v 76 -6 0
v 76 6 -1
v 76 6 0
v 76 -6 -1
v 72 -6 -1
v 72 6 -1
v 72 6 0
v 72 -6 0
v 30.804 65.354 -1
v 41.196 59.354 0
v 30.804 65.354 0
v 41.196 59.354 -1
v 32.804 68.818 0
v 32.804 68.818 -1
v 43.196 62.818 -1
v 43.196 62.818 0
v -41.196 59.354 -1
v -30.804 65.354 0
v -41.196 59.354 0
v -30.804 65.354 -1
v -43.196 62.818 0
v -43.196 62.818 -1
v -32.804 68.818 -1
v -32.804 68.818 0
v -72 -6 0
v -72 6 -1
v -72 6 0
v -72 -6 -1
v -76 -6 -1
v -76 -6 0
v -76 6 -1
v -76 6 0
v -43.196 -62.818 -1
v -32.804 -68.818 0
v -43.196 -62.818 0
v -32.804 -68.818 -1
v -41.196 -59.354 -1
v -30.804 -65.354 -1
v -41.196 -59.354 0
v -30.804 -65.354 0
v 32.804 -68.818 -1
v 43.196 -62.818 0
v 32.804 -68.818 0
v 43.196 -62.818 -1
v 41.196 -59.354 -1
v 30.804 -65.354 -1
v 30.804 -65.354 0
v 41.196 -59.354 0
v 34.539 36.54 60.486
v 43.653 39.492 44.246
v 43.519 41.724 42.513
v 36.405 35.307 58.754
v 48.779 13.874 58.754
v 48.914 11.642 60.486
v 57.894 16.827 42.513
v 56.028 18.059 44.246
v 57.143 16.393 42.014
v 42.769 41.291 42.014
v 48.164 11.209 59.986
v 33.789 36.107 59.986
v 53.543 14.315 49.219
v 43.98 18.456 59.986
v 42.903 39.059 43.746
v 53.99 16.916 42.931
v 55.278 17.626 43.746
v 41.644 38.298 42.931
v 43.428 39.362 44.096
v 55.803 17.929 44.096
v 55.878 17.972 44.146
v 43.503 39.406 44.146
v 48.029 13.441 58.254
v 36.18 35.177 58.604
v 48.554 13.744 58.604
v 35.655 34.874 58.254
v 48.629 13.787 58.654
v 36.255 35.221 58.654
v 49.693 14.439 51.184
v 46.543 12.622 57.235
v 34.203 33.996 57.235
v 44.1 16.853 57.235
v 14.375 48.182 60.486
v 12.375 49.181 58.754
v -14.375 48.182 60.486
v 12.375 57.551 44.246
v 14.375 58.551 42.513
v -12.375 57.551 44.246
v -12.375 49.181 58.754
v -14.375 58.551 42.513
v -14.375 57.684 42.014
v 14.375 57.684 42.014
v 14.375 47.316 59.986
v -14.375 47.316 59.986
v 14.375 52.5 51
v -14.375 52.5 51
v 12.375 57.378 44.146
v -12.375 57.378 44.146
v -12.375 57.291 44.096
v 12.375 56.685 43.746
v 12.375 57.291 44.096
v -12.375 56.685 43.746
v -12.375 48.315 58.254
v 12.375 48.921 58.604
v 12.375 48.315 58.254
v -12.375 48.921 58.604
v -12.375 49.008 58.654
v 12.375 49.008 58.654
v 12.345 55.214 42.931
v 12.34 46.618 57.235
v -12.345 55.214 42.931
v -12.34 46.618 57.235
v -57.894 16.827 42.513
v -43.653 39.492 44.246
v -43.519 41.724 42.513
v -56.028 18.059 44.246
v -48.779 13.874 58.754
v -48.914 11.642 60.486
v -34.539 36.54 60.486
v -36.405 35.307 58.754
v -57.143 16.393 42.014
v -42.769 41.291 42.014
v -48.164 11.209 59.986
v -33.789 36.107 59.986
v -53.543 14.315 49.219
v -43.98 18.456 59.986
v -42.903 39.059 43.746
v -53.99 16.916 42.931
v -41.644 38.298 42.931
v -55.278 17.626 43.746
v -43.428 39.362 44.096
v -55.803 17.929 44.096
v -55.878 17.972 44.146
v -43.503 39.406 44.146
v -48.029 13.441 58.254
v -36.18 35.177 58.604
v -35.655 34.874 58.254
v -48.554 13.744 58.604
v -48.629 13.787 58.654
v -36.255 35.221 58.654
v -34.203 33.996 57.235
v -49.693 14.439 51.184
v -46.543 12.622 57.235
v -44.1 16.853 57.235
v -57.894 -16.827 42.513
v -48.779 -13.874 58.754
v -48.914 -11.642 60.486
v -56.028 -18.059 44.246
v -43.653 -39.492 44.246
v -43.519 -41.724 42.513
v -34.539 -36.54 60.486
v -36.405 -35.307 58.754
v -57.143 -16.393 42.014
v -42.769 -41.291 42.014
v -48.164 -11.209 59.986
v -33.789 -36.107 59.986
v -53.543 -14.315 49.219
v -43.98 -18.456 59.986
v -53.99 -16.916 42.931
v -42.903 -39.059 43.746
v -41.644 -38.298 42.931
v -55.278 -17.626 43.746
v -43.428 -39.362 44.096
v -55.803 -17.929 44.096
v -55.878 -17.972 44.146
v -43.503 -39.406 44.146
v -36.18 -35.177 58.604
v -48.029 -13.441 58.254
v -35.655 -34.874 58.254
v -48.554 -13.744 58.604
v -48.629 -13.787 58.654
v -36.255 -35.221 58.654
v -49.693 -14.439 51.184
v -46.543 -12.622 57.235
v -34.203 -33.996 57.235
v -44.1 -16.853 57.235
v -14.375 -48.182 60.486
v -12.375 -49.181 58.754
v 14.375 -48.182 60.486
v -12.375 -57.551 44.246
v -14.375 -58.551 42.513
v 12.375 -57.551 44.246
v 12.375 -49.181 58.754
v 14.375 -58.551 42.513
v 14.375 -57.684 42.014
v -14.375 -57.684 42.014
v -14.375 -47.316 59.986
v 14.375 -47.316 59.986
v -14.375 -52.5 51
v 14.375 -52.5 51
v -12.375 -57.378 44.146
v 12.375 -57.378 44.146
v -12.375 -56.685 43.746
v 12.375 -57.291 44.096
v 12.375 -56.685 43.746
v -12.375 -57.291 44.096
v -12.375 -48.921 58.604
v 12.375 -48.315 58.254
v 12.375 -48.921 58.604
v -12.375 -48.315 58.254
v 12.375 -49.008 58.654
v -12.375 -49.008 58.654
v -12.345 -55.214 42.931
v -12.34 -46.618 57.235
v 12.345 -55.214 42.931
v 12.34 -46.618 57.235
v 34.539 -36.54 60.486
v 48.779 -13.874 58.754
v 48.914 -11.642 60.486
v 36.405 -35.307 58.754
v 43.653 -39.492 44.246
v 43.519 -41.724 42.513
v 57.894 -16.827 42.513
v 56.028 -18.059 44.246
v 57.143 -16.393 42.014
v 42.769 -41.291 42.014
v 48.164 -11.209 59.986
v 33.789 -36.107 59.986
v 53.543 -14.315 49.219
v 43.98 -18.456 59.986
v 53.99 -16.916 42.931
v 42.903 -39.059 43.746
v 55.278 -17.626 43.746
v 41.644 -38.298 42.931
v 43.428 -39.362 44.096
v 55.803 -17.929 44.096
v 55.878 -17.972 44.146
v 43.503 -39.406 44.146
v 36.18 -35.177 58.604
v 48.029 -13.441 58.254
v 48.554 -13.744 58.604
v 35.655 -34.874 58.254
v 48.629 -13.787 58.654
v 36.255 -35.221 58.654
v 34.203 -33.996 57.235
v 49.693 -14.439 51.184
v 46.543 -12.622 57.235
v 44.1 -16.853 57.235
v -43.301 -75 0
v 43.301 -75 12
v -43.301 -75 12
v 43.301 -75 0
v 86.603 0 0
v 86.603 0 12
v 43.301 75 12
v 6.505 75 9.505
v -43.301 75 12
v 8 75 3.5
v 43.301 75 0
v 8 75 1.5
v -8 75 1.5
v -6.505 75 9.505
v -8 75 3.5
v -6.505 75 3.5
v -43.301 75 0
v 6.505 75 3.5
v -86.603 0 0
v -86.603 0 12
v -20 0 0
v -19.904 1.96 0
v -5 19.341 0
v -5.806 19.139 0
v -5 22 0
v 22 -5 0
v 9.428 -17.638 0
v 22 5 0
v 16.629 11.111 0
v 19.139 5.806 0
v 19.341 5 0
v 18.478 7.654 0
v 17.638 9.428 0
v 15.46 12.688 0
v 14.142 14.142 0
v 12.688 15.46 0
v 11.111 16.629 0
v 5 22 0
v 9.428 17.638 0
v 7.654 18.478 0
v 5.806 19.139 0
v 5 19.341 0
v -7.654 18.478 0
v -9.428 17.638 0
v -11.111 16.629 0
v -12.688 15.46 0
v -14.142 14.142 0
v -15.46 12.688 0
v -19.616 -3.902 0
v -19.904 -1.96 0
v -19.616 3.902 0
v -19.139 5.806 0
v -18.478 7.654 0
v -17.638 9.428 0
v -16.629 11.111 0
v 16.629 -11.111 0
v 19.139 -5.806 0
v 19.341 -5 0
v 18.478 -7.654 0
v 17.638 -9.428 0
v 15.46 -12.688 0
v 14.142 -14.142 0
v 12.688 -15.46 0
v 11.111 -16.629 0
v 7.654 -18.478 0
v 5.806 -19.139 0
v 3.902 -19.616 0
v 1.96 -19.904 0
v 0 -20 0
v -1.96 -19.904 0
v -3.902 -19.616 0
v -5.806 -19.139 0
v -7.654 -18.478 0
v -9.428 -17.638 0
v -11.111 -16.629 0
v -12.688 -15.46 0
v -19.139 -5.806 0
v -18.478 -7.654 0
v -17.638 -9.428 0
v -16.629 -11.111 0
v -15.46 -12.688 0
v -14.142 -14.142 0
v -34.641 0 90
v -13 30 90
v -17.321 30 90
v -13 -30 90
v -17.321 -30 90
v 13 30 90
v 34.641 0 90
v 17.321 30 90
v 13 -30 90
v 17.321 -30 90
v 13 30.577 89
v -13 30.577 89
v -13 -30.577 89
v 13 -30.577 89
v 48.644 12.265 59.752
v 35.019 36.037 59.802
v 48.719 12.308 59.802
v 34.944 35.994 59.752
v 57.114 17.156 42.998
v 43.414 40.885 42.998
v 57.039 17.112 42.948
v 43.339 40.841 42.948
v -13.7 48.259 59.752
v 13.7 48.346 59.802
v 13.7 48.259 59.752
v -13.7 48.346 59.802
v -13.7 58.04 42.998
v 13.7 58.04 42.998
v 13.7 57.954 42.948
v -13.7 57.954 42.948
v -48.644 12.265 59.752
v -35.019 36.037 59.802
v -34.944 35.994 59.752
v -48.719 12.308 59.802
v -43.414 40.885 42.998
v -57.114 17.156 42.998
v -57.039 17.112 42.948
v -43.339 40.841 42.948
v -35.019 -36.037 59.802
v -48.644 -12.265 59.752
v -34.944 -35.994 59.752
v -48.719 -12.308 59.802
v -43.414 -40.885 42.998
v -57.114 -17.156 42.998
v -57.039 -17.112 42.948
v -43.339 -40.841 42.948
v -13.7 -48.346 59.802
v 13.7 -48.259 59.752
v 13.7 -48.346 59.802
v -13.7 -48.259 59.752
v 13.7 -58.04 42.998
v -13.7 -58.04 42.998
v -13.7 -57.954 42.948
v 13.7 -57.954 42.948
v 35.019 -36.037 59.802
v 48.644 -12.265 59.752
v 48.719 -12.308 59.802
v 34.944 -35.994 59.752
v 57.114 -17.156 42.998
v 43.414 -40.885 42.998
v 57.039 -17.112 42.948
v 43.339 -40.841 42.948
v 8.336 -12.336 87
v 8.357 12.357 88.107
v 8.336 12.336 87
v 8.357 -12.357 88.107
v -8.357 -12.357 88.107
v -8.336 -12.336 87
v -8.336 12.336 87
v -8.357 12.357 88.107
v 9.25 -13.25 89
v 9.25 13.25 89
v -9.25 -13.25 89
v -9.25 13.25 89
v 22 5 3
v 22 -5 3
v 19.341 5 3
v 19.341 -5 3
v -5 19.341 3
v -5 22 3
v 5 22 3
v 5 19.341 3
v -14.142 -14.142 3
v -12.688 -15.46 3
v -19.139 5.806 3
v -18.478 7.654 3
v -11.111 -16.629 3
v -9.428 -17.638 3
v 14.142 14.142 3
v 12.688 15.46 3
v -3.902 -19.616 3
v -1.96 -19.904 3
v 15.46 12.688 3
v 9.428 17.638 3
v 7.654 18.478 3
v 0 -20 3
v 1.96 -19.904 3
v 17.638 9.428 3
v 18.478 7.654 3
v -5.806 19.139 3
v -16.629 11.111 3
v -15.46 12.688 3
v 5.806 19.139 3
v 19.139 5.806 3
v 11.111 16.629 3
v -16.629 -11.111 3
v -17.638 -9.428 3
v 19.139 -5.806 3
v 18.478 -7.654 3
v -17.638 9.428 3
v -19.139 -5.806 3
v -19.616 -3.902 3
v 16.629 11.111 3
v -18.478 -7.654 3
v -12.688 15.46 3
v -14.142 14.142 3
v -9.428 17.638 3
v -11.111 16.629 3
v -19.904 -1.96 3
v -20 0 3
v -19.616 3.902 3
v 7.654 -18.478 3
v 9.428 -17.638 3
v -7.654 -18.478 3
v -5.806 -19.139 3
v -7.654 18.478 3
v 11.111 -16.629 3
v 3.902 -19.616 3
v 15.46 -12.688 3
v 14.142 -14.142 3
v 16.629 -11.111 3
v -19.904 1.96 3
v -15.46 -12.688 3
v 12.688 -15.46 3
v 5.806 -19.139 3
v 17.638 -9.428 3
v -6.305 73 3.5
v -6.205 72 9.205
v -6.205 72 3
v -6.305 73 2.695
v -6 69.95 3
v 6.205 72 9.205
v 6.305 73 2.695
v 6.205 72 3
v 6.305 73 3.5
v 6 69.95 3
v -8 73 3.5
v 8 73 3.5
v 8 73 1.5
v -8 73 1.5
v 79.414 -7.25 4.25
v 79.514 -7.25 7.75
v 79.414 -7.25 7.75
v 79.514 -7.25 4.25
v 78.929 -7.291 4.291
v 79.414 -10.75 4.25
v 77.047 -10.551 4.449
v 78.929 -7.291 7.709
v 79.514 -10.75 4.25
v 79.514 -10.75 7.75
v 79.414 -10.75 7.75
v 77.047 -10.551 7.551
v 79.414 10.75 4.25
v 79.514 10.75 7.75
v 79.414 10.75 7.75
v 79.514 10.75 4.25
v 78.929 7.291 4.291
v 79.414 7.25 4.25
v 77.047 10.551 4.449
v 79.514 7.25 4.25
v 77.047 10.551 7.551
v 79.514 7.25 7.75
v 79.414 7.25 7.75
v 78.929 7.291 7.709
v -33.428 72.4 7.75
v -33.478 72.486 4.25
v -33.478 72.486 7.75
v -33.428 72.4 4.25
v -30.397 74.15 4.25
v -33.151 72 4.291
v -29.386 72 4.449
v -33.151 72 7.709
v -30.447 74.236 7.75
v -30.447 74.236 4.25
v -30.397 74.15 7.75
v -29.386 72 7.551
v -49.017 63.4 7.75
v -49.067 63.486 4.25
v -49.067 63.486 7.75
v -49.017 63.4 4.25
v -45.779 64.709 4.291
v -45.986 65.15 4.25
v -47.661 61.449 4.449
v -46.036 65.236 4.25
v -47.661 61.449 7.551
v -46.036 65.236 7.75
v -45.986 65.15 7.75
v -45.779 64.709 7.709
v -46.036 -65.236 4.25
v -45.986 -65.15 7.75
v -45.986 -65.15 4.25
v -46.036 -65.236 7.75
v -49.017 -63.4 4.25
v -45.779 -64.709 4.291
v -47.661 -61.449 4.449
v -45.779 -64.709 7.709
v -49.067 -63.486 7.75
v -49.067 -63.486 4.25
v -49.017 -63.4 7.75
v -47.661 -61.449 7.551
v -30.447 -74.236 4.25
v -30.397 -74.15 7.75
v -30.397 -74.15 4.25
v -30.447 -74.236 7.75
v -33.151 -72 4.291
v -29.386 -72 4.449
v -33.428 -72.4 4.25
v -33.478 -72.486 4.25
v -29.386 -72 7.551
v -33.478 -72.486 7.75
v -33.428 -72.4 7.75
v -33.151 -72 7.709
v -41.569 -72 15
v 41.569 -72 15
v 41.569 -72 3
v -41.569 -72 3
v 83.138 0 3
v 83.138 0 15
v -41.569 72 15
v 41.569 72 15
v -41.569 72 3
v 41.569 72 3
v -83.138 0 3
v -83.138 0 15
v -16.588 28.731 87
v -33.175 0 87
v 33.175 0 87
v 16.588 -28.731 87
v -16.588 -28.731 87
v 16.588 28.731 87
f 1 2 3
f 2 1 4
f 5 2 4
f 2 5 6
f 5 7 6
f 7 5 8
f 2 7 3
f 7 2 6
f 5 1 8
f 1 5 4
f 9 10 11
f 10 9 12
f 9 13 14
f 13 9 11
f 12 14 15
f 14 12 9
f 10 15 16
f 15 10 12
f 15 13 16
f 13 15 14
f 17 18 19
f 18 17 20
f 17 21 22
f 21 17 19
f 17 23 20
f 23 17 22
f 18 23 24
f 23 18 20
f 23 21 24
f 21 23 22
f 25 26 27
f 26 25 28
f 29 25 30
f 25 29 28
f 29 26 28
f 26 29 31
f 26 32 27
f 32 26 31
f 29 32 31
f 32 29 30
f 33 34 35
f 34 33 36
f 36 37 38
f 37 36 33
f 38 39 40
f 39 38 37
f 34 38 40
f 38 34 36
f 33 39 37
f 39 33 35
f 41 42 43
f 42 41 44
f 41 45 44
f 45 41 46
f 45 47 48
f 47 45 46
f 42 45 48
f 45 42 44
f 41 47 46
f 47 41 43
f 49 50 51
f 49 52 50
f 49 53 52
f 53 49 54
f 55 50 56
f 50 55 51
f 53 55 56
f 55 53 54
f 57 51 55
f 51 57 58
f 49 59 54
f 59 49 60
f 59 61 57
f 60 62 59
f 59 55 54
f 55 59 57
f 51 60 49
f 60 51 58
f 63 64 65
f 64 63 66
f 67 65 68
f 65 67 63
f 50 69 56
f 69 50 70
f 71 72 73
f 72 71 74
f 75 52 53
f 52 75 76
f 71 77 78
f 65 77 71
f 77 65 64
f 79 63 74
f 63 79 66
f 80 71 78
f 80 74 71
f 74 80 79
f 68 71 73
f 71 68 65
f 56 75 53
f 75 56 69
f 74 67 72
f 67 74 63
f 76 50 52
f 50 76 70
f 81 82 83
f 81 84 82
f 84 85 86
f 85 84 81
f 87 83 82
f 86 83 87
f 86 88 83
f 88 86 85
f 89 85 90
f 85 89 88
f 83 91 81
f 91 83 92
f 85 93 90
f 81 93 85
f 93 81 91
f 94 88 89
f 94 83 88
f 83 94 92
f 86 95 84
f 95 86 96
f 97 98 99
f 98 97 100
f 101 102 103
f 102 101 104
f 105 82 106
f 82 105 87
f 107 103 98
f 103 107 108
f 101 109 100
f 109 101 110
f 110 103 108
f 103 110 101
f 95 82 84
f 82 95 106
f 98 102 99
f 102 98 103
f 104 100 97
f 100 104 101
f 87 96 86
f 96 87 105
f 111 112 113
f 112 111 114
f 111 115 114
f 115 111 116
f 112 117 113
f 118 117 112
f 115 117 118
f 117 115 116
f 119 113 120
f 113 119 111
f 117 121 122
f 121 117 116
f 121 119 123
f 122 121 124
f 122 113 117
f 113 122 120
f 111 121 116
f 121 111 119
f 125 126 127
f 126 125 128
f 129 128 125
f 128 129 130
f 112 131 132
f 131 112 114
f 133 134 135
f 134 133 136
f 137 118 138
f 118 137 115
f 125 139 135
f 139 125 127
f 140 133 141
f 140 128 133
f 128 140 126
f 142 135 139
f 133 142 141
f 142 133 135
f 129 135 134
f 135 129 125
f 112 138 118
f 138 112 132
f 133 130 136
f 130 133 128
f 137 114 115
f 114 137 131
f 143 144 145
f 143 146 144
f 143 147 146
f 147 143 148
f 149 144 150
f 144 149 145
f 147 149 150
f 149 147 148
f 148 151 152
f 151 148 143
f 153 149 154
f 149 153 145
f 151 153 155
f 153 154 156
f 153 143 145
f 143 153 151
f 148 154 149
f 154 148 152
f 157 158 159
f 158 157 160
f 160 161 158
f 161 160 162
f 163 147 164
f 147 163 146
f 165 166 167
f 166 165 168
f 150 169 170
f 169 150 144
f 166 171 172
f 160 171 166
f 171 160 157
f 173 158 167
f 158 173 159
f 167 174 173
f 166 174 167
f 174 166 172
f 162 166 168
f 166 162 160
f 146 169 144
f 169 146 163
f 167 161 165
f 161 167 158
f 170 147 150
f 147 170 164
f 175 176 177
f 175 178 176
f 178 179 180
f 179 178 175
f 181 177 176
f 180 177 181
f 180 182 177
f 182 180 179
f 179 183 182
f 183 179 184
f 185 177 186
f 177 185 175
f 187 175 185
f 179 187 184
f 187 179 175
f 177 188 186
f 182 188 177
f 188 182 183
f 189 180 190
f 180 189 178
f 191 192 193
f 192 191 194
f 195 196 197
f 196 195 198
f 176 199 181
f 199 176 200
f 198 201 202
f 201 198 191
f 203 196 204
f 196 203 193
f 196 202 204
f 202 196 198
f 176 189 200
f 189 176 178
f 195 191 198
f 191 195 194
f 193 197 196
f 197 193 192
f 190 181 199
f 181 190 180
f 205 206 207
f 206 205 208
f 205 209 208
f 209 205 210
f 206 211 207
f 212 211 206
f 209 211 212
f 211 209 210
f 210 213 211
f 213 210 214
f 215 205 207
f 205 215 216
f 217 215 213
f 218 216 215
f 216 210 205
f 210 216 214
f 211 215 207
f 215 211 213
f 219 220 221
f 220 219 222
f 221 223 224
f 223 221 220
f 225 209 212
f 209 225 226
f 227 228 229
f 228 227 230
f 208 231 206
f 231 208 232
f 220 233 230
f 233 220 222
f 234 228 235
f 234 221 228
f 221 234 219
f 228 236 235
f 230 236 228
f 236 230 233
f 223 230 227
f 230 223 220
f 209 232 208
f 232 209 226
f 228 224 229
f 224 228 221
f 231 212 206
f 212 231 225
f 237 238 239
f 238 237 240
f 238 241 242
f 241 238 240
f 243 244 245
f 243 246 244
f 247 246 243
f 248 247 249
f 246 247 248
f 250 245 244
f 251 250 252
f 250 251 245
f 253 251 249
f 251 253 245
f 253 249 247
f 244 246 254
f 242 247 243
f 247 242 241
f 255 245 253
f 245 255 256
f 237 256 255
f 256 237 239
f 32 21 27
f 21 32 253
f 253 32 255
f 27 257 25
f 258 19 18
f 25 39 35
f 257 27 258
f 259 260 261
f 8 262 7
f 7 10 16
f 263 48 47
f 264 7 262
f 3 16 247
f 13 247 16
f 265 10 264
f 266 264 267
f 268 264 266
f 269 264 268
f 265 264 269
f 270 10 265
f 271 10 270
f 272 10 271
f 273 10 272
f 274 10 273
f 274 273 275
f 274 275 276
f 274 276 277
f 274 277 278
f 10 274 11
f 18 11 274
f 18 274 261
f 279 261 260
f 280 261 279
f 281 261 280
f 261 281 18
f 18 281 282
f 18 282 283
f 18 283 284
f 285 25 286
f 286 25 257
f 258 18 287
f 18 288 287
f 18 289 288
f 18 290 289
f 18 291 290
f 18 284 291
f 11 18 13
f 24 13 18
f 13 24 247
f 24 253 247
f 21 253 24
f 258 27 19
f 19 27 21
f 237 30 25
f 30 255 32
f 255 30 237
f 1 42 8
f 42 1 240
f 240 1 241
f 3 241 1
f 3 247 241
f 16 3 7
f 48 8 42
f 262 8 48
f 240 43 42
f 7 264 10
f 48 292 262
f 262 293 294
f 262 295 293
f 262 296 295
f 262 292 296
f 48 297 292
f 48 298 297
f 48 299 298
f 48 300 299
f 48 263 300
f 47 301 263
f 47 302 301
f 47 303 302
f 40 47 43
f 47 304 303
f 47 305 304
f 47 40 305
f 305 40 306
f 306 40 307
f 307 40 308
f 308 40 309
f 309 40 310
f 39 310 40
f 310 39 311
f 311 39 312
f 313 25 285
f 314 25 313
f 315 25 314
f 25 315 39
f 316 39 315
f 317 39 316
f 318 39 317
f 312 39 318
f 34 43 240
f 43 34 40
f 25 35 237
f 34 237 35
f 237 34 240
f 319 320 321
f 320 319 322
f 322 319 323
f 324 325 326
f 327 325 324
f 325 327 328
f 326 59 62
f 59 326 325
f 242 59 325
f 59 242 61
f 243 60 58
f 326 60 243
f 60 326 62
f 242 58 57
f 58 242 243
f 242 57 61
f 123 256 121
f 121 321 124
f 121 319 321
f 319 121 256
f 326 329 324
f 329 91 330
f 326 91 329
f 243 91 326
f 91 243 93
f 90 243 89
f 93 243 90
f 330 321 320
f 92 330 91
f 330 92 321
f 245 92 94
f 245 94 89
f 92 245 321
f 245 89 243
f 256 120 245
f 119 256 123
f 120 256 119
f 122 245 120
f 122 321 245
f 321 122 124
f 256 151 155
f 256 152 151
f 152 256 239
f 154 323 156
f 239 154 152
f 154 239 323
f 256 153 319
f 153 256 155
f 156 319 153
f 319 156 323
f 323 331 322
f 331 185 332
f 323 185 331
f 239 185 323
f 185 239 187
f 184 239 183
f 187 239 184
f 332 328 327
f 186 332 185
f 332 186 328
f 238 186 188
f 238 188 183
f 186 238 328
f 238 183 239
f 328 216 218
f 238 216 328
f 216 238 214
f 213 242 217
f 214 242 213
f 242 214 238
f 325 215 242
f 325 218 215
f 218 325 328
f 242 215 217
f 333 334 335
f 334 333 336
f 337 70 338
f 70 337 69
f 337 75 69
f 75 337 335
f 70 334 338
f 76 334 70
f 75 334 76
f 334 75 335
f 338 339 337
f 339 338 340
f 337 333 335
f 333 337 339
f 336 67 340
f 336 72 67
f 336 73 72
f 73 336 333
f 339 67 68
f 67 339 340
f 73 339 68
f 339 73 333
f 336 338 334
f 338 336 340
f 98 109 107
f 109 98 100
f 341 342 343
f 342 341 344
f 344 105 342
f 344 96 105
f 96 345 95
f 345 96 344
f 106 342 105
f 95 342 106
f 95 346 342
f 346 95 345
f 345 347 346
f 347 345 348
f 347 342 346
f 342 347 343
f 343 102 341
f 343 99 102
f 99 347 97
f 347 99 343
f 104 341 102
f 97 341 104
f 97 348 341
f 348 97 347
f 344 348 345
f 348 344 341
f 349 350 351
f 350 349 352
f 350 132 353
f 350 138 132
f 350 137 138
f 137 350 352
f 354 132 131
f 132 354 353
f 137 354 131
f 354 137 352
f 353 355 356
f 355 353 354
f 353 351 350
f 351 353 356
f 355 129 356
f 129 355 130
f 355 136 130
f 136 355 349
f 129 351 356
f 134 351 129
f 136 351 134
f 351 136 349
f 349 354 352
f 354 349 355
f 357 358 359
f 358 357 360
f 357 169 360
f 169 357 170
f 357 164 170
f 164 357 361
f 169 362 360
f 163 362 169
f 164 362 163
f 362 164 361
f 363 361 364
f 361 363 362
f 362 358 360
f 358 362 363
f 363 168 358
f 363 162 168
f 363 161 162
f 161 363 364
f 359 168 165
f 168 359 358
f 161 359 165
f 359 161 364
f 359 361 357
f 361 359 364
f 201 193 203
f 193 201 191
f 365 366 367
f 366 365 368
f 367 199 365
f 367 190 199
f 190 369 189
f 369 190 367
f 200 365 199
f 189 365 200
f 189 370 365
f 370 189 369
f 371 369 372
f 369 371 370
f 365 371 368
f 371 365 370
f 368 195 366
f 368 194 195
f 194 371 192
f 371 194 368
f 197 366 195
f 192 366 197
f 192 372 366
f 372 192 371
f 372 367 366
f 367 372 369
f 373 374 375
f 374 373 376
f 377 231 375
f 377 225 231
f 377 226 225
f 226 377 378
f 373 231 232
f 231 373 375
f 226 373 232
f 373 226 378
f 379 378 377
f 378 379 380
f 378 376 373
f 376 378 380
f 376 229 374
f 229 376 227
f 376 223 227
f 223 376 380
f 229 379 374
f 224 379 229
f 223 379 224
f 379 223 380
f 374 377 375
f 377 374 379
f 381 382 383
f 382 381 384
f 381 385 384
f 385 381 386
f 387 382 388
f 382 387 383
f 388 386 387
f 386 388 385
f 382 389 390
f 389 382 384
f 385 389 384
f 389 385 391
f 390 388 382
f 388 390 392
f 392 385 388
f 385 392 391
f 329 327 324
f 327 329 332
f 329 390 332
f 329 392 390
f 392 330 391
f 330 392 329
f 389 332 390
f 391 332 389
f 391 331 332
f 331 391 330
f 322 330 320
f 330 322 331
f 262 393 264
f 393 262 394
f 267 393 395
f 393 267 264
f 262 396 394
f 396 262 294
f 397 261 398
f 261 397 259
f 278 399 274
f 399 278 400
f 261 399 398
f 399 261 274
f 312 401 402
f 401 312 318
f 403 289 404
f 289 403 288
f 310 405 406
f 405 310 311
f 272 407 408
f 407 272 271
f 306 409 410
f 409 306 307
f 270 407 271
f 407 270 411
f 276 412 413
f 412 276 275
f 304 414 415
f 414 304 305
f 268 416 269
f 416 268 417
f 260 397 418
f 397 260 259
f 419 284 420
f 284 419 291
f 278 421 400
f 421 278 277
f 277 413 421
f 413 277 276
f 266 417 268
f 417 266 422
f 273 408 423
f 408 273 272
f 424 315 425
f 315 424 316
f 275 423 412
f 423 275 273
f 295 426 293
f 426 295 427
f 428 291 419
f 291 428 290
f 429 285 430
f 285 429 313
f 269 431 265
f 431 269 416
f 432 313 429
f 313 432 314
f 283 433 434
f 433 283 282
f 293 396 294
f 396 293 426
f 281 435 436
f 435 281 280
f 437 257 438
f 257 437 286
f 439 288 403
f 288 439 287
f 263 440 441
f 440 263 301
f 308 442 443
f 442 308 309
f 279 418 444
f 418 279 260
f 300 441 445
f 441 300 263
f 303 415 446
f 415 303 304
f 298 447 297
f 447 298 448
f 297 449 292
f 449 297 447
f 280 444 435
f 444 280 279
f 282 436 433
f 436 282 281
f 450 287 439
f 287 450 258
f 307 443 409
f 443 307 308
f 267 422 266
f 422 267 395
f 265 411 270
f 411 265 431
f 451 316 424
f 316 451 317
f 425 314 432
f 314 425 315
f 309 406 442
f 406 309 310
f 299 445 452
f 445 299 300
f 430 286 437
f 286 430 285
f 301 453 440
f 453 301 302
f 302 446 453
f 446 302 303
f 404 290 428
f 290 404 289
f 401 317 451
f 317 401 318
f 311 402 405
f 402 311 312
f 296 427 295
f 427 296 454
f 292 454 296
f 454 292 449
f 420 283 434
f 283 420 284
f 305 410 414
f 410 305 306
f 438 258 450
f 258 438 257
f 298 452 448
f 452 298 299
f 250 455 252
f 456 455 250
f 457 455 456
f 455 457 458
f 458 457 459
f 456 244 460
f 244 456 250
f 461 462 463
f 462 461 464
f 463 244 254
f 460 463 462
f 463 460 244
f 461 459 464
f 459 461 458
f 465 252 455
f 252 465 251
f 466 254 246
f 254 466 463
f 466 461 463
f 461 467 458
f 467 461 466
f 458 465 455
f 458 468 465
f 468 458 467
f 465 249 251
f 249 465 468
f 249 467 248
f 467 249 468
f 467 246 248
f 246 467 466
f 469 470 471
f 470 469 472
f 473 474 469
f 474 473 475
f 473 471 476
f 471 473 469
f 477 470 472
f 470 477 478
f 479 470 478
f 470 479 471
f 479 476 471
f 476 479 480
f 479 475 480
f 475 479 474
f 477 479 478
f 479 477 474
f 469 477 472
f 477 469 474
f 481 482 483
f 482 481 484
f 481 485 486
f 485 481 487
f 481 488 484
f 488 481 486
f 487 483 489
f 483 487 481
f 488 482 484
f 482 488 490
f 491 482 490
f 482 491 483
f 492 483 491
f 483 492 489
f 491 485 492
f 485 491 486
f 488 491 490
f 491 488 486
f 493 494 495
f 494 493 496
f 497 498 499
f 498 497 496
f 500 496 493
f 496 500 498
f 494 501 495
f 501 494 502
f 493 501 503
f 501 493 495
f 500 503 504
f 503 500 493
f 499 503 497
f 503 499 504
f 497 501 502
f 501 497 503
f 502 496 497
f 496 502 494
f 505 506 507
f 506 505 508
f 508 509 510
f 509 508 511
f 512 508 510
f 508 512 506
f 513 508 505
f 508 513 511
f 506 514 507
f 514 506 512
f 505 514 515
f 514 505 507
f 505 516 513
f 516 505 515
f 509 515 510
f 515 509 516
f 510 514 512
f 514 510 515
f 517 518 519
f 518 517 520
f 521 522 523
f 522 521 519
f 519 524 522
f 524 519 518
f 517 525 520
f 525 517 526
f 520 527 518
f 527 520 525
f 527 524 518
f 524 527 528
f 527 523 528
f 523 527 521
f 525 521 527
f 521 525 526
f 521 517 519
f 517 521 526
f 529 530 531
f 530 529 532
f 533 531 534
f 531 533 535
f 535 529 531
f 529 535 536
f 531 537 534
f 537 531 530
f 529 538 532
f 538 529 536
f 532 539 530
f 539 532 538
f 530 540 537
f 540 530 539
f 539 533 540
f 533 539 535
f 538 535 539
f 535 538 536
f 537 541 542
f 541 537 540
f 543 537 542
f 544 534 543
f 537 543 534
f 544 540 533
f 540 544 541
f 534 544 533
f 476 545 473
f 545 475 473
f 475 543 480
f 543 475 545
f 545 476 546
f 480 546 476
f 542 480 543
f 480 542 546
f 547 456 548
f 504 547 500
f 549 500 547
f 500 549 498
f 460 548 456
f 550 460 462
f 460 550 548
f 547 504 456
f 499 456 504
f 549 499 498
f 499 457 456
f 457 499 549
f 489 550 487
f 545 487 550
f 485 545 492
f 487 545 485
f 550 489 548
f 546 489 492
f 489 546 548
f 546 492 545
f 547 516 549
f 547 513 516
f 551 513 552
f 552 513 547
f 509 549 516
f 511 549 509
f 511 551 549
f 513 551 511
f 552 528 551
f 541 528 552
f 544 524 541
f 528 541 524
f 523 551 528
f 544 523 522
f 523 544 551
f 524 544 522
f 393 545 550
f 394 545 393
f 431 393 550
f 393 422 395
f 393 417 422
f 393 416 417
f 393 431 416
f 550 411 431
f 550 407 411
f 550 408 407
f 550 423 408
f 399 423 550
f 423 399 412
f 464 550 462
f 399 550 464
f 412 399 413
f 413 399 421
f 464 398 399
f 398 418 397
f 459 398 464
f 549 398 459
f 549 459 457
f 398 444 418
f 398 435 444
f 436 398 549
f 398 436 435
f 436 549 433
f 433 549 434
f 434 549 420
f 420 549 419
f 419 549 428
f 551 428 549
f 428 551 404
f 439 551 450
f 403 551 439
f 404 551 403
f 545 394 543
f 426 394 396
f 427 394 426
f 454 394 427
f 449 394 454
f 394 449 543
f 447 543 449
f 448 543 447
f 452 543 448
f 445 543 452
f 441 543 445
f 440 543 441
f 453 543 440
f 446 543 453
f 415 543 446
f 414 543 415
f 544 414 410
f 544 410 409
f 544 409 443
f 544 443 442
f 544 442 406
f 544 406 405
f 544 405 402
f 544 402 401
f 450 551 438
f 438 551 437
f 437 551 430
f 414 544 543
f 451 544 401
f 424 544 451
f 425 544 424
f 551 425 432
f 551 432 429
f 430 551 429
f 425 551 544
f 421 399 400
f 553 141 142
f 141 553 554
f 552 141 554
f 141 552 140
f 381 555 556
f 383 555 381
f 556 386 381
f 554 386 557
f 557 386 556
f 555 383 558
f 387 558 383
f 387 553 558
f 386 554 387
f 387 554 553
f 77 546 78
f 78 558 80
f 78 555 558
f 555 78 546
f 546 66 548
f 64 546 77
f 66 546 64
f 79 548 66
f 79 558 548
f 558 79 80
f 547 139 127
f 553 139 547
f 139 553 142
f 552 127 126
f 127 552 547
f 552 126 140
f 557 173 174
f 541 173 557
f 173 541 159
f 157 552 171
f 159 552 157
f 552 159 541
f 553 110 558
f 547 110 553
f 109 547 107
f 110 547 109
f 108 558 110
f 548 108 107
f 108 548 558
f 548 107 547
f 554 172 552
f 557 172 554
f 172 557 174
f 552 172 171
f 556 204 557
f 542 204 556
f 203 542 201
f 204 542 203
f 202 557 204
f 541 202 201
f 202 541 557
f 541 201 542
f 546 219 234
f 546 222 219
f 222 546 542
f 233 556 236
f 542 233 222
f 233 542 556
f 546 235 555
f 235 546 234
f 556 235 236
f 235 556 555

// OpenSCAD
// ==========================================
// Xentient Framework - Main Node Module V3
// Scaled: 150mm base, 90mm height, stack zoning
// ==========================================
// Print: PETG, 0.2mm layers, 45° overhangs (support-free)
// Bed: Base (150mm F2F) flat on bed, rear face down
// Units: mm
//
// V3 — Clean hollow shell. All interior features are separate prints.
// See nodebase/SPEC-v3.md for interior module print list + glue positions.

$fn = 128;

// ==========================================
// 1. MASTER PARAMETERS
// ==========================================

// --- Hub Shell (Truncated Hex Pyramid) ---
Base_F2F    = 150.0;
Front_F2F   = 60.0;
Total_Depth = 90.0;
Collar_H    = 12.0;
Shell_T     = 3.0;

// Derived geometry
Base_R    = (Base_F2F / 2) / cos(30);     // 80.83
Front_R   = (Front_F2F / 2) / cos(30);    // 34.64
Pyr_H     = Total_Depth - Collar_H;        // 78
Base_Apo  = Base_F2F / 2;                  // 70
Front_Apo = Front_F2F / 2;                 // 30
Face_Tilt = atan((Base_Apo - Front_Apo) / Pyr_H);  // ~27.9 deg

// Inner cavity
Inner_Base_R  = Base_R - Shell_T / cos(30);    // ~77.37
Inner_Front_Z = Total_Depth - Shell_T;          // Z=87
Outer_R_at_front  = Base_R + (Front_R - Base_R) * (Inner_Front_Z - Collar_H) / Pyr_H;
Inner_Front_R2 = Outer_R_at_front - Shell_T / cos(30);  // ~32.17

// --- Universal Socket Pocket ---
Port_W       = 24.4;    // Male sled width + 0.4mm tolerance
Port_H       = 16.4;    // Male sled height + 0.4mm tolerance
Port_D       = 10.0;    // Pocket depth per Framework §2 (10mm female socket)
WireCh_W     = 18.0;    // Wire channel width
WireCh_H     = 8.0;     // Wire channel height
Mounting_Lip = 2.0;     // Internal flange for JST-breakout PCB
Breakout_W   = 30.0;    // JST-breakout PCB width
Breakout_H   = 20.0;    // JST-breakout PCB height
Sleeve_Wall  = 2.0;     // Pocket sleeve wall thickness

// --- Fastener specs ---
M3_Hole   = 3.2;   // M3 heat-set insert hole
M3_Boss   = 5.0;   // Slim M3 boss
M3_Insert = 4.2;   // Heat-set insert for M3
M2_Hole   = 2.4;   // M2 screw body
M2_Boss   = 4.0;   // Slim M2 boss (spec says 4mm)

// --- Rear Anchor ---
Anchor_Dia = 40.0;
Anchor_Dep = 6.0;
Anchor_Key = 10.0;

// --- Ventilation ---
Vent_N      = 4;       // Slits per face set
Vent_W      = 2.0;     // Slit width
Vent_Spc    = 6.0;     // Slit spacing
Wall_Thick  = Shell_T / cos(30);  // ~3.46mm

// --- USB-C Cutout ---
USB_W = 12.0;   // V3 spec: 12mm (was 14mm)
USB_H = 6.0;

// --- LCD Display ---
LCD_W       = 71.0;
LCD_H       = 26.0;
LCD_D       = 15.0;
LCD_Mount_X = 32.0;
LCD_Mount_Y = 12.0;

// ==========================================
// 3. SOCKET POCKET NEGATIVE (cuts opening through wall + sleeve)
// ==========================================

module socket_pocket_negative() {
    draft_off = Port_D * tan(1.0);  // 1 deg draft

    // Main pocket passage (Port_H is vertical, Port_W is horizontal)
    hull() {
        translate([0, 0, 0.5])
            cube([Port_H + 2*draft_off, Port_W + 2*draft_off, 1], center=true);
        translate([0, 0, -Port_D + 0.5])
            cube([Port_H, Port_W, 1], center=true);
    }

    // Wire pass-through (continues past pocket into cavity)
    translate([0, 0, -Port_D/2 - 10])
        cube([WireCh_H, WireCh_W, 20], center=true);

    // 45 deg entry chamfer
    chamfer_z = 1.5;
    translate([0, 0, chamfer_z / 2])
        hull() {
            cube([Port_H + 2*chamfer_z, Port_W + 2*chamfer_z, 0.1], center=true);
            cube([Port_H + 2*draft_off, Port_W + 2*draft_off, 0.1], center=true);
        }

    // Breakout PCB mounting lip recesses (2mm flange, 30x20mm PCB)
    // Cut screw holes for M2 at corners of 30x20 breakout
    bp_w = Breakout_W - 4;  // screw span width
    bp_h = Breakout_H - 4;  // screw span height
    translate([0, 0, -Port_D])
        for (sx = [-1, 1], sy = [-1, 1]) {
            translate([sx * bp_w/2, sy * bp_h/2, 0])
                cylinder(h=Mounting_Lip + 1, d=M2_Hole, $fn=24);
        }
}

// ==========================================
// 4. SOCKET POCKET SLEEVE (positive: adds pocket depth)
// ==========================================

module socket_pocket_sleeve() {
    // Positive boss extending inward from inner wall surface
    // Creates the 10mm deep recessed pocket per Framework §2
    // Wall swells from 3mm to ~10mm only at socket locations

    draft_off = Port_D * tan(1.0);

    difference() {
        // Outer sleeve body (24.4 + 2*2 = 28.4mm wide, 16.4 + 2*2 = 20.4mm tall)
        hull() {
            translate([0, 0, 0.5])
                cube([Port_H + 2*Sleeve_Wall + 2*draft_off,
                      Port_W + 2*Sleeve_Wall + 2*draft_off, 1], center=true);
            translate([0, 0, -Port_D + 0.5])
                cube([Port_H + 2*Sleeve_Wall, Port_W + 2*Sleeve_Wall, 1], center=true);
        }

        // Inner passage (matches pocket opening with draft)
        hull() {
            translate([0, 0, 0.5])
                cube([Port_H + 2*draft_off, Port_W + 2*draft_off, 1], center=true);
            translate([0, 0, -Port_D + 0.5])
                cube([Port_H, Port_W, 1], center=true);
        }

        // Wire channel opening at the back of the sleeve
        translate([0, 0, -Port_D])
            cube([WireCh_H, WireCh_W, 4], center=true);

        // Breakout PCB mounting lip (2mm flange recess)
        // This creates a shelf for the 30x20 JST-breakout PCB
        translate([0, 0, -Port_D + Mounting_Lip/2])
            cube([Breakout_W, Breakout_H, Mounting_Lip], center=true);
    }
}

// ==========================================
// 5. FRONT CENTER PORT (Top Face - LCD Display)
// ==========================================

module front_port_negative() {
    // Pocket cutout through front face + sleeve (with 1° draft, matching side pockets)
    draft_off = Port_D * tan(1.0);
    translate([0, 0, Total_Depth - Port_D / 2])
        hull() {
            translate([0, 0, Port_D/2 - 0.5])
                cube([Port_H + 2*draft_off, Port_W + 2*draft_off, 1], center=true);
            translate([0, 0, -Port_D/2 + 0.5])
                cube([Port_H, Port_W, 1], center=true);
        };

    // Wire channel inward
    translate([0, 0, Inner_Front_Z / 2 + Shell_T])
        cube([WireCh_H, WireCh_W, Inner_Front_Z - Port_D], center=true);

    // 45 deg chamfer at entry
    translate([0, 0, Total_Depth - 0.5])
        hull() {
            cube([Port_H + 3, Port_W + 3, 0.1], center=true);
            translate([0, 0, -1.5])
                cube([Port_H, Port_W, 0.1], center=true);
        };

    // LCD bezel window (71x26mm)
    translate([0, 0, Total_Depth + 1])
        cube([LCD_H, LCD_W, 4], center=true);

    // Breakout PCB mounting holes (same as side pockets)
    bp_w = Breakout_W - 4;
    bp_h = Breakout_H - 4;
    translate([0, 0, Total_Depth - Port_D])
        for (sx = [-1, 1], sy = [-1, 1]) {
            translate([sx * bp_w/2, sy * bp_h/2, 0])
                cylinder(h=Mounting_Lip + 1, d=M2_Hole, $fn=24);
        }
}

module front_port_sleeve() {
    // Sleeve behind front face for display sled depth
    draft_off = Port_D * tan(1.0);

    difference() {
        hull() {
            translate([0, 0, -0.5])
                cube([Port_H + 2*Sleeve_Wall + 2*draft_off,
                      Port_W + 2*Sleeve_Wall + 2*draft_off, 1], center=true);
            translate([0, 0, -Port_D + 0.5])
                cube([Port_H + 2*Sleeve_Wall, Port_W + 2*Sleeve_Wall, 1], center=true);
        }
        hull() {
            translate([0, 0, -0.5])
                cube([Port_H + 2*draft_off, Port_W + 2*draft_off, 1], center=true);
            translate([0, 0, -Port_D + 0.5])
                cube([Port_H, Port_W, 1], center=true);
        }
        translate([0, 0, -Port_D - 1])
            cube([WireCh_H, WireCh_W, 4], center=true);

        // Breakout PCB mounting lip
        translate([0, 0, -Port_D + Mounting_Lip/2])
            cube([Breakout_W, Breakout_H, Mounting_Lip], center=true);
    }
}

// ==========================================
// 6. USB-C CUTOUT
// ==========================================

module usb_c_cutout_negative() {
    // USB-C on collar face, aligned with TP4056 module (Y=30)
    rotate([0, 0, 90])
        translate([Base_Apo, 0, Collar_H / 2])
            rotate([0, 90, 0])
                hull() {
                    translate([0, 0, Shell_T + 2])
                        cube([USB_H + 2, USB_W + 2, 0.1], center=true);
                    translate([0, 0, -(Shell_T + 2)])
                        cube([USB_H, USB_W, 0.1], center=true);
                }
    // Floor overcut: 1mm below floor for thick cable plug housing
    rotate([0, 0, 90])
        translate([Base_Apo, 0, Shell_T - 0.5])
            cube([4, USB_W + 4, 2], center=true);
}

// ==========================================
// 7. VENTILATION (Thermal Gills)
// ==========================================

module ventilation_negative() {
    // Slits on faces between sensor ports
    // Row 1: collar level (original)
    // Row 2: mid-body level (added for deeper 90mm body)
    for (i = [0 : Vent_N - 1]) {
        y_off = (i - (Vent_N - 1)/2) * Vent_Spc;
        // Row 1 - collar
        translate([0, y_off, Collar_H / 2])
            rotate([0, 90, 0])
                hull() {
                    translate([0, 0, Wall_Thick + 1])
                        cube([Vent_W + 1.5, Vent_W + 1.5, 0.1], center=true);
                    translate([0, 0, -(Wall_Thick + 1)])
                        cube([Vent_W, Vent_W, 0.1], center=true);
                };
        // Row 2 - mid-body
        translate([0, y_off, Collar_H + Pyr_H * 0.4])
            rotate([0, 90, 0])
                hull() {
                    translate([0, 0, Wall_Thick + 1])
                        cube([Vent_W + 1.5, Vent_W + 1.5, 0.1], center=true);
                    translate([0, 0, -(Wall_Thick + 1)])
                        cube([Vent_W, Vent_W, 0.1], center=true);
                };
    }
}

// ==========================================
// 11. REAR ANCHOR
// ==========================================

module rear_anchor_negative() {
    translate([0, 0, -1])
        cylinder(h=Anchor_Dep + 1, d=Anchor_Dia, $fn=64);

    for (a = [0, 90]) {
        rotate([0, 0, a])
            translate([0, -Anchor_Key/2, -1])
                cube([Anchor_Dia/2 + 2, Anchor_Key, Anchor_Dep + 1]);
    }

    translate([0, 0, -10])
        cylinder(h=30, d=15, $fn=32);
}

// ==========================================
// 12. MAIN ASSEMBLY
// ==========================================

module xentient_hub_v3() {
    // Port positions along Z-axis (midpoint of pocket)
    port_Z = Collar_H + Pyr_H * 0.5;
    port_apo = Base_Apo - (Base_Apo - Front_Apo) * ((port_Z - Collar_H) / Pyr_H);

    inner_r_base = Inner_Base_R;
    inner_r_front = Inner_Front_R2;

    difference() {
        // ====== OUTER HULL + POCKET SLEEVES ======
        union() {
            // Rear collar
            cylinder(h=Collar_H, r=Base_R, $fn=6);
            // Tapered body
            translate([0, 0, Collar_H])
                cylinder(h=Pyr_H, r1=Base_R, r2=Front_R, $fn=6);
            // Aesthetic ribs (extend along collar)
            for (i = [0 : 60 : 359]) {
                rotate([0, 0, i])
                    translate([Base_F2F/2 - 1, 0, Collar_H/2])
                        cube([4, 12, Collar_H + 2], center=true);
            }

            // 6x Side pocket sleeves (10mm recessed sleeve per Framework §2)
            for (a = [30 : 60 : 330]) {
                rotate([0, 0, a])
                    translate([port_apo, 0, port_Z])
                        rotate([0, 90 - Face_Tilt, 0])
                            socket_pocket_sleeve();
            }

            // Top face pocket sleeve (10mm depth per Framework §2)
            translate([0, 0, Total_Depth - Port_D/2])
                rotate([0, 0, 90])
                    front_port_sleeve();
        }

        // ====== HOLLOW CORE ======
        translate([0, 0, Shell_T])
            cylinder(h=Collar_H, r=inner_r_base, $fn=6);
        translate([0, 0, Shell_T + Collar_H])
            cylinder(h=Inner_Front_Z - Shell_T - Collar_H,
                     r1=inner_r_base,
                     r2=inner_r_front, $fn=6);

        // ====== 6x SIDE POCKETS ======
        for (a = [30 : 60 : 330]) {
            rotate([0, 0, a])
                translate([port_apo, 0, port_Z])
                    rotate([0, 90 - Face_Tilt, 0])
                        socket_pocket_negative();
        }

        // ====== TOP CENTER POCKET ======
        front_port_negative();

        // ====== REAR ANCHOR ======
        rear_anchor_negative();

        // ====== USB-C CUTOUT ======
        usb_c_cutout_negative();

        // ====== VENTILATION GILLS ======
        // On 3 alternate faces (between port faces)
        for (a = [0, 120, 240]) {
            rotate([0, 0, a])
                translate([Base_Apo, 0, 0])
                    ventilation_negative();
        }
    }

    // ====== CLEAN ATRIUM — all interior features are separate prints ======
    // Shell provides ONLY: pockets, sleeves, USB-C, ventilation, rear anchor, collar ribs.
    // Everything inside (rail guides, keyway strips, landing pads, zone plates,
    // reference markers) is a separate .scad file printed and glued in.
    // See SPEC-v3.md for glue positions and print counts.
}

// ==========================================
// RENDER
// ==========================================

xentient_hub_v3();
